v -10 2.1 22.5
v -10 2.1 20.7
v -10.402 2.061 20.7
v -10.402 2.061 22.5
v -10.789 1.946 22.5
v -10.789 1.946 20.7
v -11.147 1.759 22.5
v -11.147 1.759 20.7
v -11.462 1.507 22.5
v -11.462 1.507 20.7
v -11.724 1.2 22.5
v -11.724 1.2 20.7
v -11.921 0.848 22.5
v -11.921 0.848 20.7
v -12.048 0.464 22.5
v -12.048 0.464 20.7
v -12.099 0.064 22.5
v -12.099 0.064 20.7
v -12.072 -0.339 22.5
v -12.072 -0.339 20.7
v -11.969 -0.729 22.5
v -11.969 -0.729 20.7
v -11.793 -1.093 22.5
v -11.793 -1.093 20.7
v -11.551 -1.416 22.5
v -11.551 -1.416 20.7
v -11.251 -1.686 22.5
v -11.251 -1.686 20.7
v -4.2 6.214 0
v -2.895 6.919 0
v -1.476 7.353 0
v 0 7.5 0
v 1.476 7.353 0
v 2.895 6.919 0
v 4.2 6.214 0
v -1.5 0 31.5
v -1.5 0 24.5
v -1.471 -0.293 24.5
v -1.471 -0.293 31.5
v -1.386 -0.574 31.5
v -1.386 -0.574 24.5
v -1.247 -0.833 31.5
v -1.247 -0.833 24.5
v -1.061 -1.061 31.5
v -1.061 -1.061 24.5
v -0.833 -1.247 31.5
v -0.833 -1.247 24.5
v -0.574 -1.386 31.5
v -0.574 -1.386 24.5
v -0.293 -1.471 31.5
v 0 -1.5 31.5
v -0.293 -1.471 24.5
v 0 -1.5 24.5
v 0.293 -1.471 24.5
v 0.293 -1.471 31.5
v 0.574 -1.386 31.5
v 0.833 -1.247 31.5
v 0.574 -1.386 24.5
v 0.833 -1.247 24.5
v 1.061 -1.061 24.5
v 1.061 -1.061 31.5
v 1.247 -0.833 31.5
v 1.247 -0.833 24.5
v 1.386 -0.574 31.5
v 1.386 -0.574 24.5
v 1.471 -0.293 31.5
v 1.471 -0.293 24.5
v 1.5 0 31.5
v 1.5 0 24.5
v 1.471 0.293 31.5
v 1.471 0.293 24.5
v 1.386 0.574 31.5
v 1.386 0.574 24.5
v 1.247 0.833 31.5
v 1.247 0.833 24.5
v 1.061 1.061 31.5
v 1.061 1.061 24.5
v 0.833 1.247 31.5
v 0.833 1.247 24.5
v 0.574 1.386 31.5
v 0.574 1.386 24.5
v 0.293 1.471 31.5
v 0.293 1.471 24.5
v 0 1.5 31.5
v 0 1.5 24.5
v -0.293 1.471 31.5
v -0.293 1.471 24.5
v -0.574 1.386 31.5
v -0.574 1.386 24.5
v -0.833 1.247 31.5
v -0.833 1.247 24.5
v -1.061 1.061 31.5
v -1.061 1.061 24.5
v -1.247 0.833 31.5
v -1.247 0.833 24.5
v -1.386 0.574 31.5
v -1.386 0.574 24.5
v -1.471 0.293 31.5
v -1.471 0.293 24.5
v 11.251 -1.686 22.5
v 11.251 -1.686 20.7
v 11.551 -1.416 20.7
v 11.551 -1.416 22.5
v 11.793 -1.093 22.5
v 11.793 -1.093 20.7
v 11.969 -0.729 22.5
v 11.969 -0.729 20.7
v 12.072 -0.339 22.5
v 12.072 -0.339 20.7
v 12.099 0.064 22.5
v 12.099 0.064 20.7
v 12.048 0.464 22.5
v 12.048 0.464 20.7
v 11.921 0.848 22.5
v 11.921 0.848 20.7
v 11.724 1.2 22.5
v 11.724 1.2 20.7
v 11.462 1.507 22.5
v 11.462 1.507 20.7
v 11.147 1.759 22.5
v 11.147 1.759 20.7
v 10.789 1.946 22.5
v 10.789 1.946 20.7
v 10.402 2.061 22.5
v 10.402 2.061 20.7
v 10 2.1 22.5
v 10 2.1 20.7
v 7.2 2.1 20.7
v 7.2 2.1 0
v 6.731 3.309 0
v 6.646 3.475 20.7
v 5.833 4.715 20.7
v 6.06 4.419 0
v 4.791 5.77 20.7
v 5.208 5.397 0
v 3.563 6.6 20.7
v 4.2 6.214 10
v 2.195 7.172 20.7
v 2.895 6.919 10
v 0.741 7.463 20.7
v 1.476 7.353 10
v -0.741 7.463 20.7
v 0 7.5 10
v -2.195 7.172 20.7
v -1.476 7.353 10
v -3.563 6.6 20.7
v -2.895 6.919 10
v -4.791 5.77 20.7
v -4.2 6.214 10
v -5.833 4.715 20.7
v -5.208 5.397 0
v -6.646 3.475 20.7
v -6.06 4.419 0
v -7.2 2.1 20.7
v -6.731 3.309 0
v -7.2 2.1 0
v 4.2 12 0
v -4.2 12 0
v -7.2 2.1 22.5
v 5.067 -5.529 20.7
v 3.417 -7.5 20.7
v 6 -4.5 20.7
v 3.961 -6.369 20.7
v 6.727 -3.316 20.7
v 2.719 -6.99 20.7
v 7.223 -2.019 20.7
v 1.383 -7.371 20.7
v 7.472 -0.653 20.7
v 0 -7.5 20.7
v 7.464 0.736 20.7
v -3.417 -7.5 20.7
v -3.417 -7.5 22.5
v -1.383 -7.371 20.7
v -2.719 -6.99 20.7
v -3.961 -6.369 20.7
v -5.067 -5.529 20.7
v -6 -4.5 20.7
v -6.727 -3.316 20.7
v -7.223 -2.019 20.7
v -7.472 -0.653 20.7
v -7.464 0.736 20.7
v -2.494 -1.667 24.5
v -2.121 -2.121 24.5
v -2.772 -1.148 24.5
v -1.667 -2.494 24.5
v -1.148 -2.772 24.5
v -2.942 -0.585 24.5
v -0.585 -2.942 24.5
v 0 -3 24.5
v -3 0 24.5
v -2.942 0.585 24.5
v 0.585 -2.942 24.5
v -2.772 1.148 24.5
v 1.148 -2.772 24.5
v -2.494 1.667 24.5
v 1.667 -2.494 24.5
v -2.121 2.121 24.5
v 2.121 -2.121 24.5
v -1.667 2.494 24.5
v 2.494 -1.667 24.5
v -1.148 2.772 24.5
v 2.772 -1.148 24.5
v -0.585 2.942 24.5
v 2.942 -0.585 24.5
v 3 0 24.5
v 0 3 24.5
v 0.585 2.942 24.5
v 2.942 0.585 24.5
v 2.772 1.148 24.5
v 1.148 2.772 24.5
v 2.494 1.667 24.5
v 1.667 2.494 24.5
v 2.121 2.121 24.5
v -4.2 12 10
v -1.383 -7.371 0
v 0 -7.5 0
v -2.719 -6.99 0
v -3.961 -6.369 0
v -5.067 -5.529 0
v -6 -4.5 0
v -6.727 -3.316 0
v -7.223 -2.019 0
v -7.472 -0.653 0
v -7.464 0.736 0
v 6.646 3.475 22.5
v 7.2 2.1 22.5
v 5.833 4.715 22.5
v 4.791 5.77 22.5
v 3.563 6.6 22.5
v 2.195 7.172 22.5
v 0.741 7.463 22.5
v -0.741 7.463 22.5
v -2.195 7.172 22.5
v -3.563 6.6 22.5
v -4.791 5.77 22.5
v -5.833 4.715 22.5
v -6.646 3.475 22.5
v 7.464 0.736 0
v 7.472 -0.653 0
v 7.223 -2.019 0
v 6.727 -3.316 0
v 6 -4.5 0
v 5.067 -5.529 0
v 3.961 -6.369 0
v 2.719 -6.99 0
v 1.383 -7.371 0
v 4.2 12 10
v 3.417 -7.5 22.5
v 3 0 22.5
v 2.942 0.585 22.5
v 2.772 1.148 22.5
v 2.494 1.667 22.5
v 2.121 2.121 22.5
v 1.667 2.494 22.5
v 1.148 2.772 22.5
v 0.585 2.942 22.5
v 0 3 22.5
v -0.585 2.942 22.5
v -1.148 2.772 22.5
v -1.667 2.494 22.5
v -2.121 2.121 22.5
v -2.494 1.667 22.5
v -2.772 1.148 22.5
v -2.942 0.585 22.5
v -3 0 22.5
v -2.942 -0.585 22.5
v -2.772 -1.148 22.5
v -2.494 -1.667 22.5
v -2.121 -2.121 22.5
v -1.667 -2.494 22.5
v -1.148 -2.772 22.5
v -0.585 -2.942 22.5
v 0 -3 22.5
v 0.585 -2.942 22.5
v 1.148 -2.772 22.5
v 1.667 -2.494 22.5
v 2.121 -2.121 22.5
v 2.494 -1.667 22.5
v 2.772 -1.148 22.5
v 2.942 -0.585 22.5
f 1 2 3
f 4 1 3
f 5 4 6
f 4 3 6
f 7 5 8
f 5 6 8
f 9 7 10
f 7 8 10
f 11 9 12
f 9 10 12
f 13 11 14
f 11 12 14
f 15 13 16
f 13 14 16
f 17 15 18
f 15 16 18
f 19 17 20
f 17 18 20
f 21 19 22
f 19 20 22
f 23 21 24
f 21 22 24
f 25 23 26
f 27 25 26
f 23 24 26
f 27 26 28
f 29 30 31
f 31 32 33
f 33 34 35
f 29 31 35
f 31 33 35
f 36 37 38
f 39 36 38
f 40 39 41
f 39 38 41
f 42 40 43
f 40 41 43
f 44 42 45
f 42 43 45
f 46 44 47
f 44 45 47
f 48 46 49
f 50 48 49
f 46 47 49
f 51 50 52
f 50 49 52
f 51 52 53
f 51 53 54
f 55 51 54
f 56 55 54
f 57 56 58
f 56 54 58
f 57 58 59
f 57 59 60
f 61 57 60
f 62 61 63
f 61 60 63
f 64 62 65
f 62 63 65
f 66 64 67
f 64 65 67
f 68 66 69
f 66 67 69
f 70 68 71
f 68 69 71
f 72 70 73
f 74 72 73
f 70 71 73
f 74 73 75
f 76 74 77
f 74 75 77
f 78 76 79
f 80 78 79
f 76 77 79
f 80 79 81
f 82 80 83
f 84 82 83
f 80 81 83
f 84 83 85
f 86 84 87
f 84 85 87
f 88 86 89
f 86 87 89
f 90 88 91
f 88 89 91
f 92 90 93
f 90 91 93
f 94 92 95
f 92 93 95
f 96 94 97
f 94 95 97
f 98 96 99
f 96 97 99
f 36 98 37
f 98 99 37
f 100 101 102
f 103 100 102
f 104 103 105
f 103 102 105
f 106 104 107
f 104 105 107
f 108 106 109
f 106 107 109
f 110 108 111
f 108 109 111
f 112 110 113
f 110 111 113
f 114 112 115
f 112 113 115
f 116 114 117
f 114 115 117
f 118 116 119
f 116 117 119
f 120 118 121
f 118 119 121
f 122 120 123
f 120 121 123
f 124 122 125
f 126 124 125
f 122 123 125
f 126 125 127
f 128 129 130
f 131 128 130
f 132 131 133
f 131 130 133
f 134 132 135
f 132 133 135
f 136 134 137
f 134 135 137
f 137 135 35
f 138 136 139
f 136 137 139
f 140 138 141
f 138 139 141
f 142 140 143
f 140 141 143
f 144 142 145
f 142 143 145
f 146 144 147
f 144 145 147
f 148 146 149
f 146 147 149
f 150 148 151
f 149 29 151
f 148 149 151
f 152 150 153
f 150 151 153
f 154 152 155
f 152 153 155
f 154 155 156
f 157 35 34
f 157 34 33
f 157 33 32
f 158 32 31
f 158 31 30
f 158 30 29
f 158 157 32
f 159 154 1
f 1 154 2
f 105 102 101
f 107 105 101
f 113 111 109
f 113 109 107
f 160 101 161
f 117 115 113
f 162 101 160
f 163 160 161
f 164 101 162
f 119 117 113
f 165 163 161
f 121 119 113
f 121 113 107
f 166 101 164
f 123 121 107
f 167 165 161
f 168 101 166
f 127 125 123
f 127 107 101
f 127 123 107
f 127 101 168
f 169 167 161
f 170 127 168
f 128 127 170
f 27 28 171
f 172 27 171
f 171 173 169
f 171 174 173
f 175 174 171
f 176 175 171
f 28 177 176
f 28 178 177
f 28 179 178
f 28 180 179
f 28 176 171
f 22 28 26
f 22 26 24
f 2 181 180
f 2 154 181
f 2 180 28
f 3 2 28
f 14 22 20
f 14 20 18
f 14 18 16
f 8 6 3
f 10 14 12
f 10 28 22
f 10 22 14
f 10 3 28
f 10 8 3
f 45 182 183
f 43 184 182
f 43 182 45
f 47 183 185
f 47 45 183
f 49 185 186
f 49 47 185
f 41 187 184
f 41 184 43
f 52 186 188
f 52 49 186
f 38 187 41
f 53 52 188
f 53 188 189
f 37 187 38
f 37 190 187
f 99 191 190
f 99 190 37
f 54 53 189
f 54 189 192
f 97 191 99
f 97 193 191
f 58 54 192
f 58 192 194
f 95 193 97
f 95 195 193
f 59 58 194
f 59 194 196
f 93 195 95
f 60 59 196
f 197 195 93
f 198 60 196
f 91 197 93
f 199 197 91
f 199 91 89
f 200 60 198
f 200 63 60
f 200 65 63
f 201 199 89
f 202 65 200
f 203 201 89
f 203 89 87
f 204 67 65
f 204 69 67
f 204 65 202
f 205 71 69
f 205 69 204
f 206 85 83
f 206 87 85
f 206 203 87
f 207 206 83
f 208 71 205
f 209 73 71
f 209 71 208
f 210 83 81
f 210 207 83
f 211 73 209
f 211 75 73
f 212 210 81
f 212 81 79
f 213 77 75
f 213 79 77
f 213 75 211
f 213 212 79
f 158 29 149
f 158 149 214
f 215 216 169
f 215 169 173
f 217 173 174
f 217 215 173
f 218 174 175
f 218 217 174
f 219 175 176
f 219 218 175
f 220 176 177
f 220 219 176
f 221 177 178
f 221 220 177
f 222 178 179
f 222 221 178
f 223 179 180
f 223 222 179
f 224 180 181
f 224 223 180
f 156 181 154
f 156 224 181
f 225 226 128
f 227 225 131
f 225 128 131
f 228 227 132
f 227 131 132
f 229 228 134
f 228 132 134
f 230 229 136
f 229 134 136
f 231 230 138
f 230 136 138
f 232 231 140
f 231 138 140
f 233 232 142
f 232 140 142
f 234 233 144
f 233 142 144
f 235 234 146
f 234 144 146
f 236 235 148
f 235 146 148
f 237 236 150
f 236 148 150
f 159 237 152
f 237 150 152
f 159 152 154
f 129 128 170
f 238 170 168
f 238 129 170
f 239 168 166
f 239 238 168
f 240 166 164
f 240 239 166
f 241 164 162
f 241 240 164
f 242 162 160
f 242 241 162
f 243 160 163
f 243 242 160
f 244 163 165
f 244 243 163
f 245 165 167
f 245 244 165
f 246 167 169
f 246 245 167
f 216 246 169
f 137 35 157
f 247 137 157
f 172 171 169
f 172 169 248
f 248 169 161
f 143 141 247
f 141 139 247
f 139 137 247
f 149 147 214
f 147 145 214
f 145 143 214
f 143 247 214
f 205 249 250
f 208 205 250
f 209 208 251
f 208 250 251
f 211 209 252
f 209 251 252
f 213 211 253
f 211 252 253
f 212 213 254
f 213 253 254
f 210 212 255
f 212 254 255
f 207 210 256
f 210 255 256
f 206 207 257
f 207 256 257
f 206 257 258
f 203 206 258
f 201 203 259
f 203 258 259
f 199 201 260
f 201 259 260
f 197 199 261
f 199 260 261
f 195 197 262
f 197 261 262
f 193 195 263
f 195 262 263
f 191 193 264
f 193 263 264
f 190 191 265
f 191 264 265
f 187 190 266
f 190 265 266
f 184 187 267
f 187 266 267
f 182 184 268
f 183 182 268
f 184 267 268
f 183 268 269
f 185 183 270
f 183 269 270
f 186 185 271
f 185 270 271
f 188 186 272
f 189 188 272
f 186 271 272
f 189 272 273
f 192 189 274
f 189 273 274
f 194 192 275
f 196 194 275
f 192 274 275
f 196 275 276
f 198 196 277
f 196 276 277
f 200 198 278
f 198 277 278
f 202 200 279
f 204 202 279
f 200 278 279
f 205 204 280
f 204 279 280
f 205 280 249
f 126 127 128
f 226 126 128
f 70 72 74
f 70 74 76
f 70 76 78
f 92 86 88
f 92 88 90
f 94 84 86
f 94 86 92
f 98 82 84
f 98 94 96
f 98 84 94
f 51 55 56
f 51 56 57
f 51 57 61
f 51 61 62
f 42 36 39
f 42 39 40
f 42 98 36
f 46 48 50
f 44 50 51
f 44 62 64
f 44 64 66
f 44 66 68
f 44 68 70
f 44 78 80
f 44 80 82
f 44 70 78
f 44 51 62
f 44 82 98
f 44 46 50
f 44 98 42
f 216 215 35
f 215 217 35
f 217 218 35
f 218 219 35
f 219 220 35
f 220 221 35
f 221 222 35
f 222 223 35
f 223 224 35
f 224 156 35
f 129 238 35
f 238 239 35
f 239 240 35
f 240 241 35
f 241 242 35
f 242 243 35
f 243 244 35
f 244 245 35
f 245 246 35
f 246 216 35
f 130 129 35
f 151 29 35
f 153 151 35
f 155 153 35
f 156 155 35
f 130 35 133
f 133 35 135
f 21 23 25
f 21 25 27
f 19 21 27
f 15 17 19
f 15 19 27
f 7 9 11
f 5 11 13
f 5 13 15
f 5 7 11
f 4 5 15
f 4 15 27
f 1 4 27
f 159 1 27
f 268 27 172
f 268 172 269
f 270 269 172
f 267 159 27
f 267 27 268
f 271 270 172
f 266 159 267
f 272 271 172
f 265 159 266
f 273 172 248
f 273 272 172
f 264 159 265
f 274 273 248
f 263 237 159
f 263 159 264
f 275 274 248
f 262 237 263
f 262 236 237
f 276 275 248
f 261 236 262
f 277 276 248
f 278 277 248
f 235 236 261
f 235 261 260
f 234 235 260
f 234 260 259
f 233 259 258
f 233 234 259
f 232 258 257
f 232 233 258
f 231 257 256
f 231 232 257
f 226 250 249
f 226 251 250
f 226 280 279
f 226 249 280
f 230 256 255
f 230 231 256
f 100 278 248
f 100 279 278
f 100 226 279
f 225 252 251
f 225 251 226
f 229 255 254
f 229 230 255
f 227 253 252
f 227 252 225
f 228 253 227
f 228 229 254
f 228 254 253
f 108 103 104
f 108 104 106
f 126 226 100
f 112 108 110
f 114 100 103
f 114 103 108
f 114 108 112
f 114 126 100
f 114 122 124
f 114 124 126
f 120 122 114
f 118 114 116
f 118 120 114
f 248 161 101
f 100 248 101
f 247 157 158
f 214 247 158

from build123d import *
from build123d.topology import SkipClean

# Parameters (mm, degrees)
BOSS_EXTRUDE1_DEPTH = 22.5
SKETCH2_R           = 3
BOSS_EXTRUDE2_DEPTH = 2
SKETCH3_OUTSIDE_W   = 33.712
SKETCH3_OUTSIDE_H   = 24.512
SKETCH3_OUTSIDE_R   = 7.5
CUT_EXTRUDE1_DEPTH  = 20.7
SKETCH4_R           = 1.5
BOSS_EXTRUDE3_DEPTH = 7
SKETCH5_W           = 8.4
SKETCH5_H           = 5.786305447
BOSS_EXTRUDE4_DEPTH = 10


with BuildPart() as part:
    # Sketch1 → Boss-Extrude1 (new body)
    with BuildSketch(Plane.XY):
        with BuildLine():
            Line((-11.251411697, -1.686407058), (-3.416992222, -7.5))
            Line((-3.416992222, -7.5), (3.416992222, -7.5))
            Line((3.416992222, -7.5), (11.251411697, -1.686407058))
            ThreePointArc((11.251411697, -1.686407058), (11.993922619, 0.658993619), (10, 2.1))
            Line((10, 2.1), (7.2, 2.1))
            ThreePointArc((7.2, 2.1), (0, 7.5), (-7.2, 2.1))
            Line((-7.2, 2.1), (-10, 2.1))
            ThreePointArc((-10, 2.1), (-11.993922619, 0.658993619), (-11.251411697, -1.686407058))
        make_face()
    extrude(amount=BOSS_EXTRUDE1_DEPTH)

    # Sketch2 → Boss-Extrude2 (add)
    with BuildSketch(Plane.XY.offset(22.5)):
        Circle(SKETCH2_R)
    extrude(amount=BOSS_EXTRUDE2_DEPTH)

    # Sketch3 outside → Cut-Extrude1 (cut)
    with SkipClean():  # the faces are left unmerged after this step: merging them gives an invalid solid
        with BuildSketch(Plane(origin=(0, 0, 0), x_dir=(-1, 0, 0), z_dir=(0, 0, -1))):
            Rectangle(SKETCH3_OUTSIDE_W, SKETCH3_OUTSIDE_H)
            with Locations(Location((0, 0, 0), (0, 0, 16.260204708))):
                Circle(SKETCH3_OUTSIDE_R, mode=Mode.SUBTRACT)
        extrude(amount=-CUT_EXTRUDE1_DEPTH, mode=Mode.SUBTRACT)
    add(part.part.scale(1), mode=Mode.REPLACE)  # the faces are merged on a copy

    # Sketch4 → Boss-Extrude3 (add)
    with BuildSketch(Plane.XY.offset(24.5)):
        with Locations(Location((0, 0, 0), (0, 0, 180))):
            Circle(SKETCH4_R)
    extrude(amount=BOSS_EXTRUDE3_DEPTH)

    # Sketch5 → Boss-Extrude4 (add)
    with BuildSketch(Plane(origin=(0, 0, 0), x_dir=(-1, 0, 0), z_dir=(0, 0, -1))):
        with Locations((0, 9.106847276)):
            Rectangle(SKETCH5_W, SKETCH5_H)
    extrude(amount=-BOSS_EXTRUDE4_DEPTH)


solid = part.part
